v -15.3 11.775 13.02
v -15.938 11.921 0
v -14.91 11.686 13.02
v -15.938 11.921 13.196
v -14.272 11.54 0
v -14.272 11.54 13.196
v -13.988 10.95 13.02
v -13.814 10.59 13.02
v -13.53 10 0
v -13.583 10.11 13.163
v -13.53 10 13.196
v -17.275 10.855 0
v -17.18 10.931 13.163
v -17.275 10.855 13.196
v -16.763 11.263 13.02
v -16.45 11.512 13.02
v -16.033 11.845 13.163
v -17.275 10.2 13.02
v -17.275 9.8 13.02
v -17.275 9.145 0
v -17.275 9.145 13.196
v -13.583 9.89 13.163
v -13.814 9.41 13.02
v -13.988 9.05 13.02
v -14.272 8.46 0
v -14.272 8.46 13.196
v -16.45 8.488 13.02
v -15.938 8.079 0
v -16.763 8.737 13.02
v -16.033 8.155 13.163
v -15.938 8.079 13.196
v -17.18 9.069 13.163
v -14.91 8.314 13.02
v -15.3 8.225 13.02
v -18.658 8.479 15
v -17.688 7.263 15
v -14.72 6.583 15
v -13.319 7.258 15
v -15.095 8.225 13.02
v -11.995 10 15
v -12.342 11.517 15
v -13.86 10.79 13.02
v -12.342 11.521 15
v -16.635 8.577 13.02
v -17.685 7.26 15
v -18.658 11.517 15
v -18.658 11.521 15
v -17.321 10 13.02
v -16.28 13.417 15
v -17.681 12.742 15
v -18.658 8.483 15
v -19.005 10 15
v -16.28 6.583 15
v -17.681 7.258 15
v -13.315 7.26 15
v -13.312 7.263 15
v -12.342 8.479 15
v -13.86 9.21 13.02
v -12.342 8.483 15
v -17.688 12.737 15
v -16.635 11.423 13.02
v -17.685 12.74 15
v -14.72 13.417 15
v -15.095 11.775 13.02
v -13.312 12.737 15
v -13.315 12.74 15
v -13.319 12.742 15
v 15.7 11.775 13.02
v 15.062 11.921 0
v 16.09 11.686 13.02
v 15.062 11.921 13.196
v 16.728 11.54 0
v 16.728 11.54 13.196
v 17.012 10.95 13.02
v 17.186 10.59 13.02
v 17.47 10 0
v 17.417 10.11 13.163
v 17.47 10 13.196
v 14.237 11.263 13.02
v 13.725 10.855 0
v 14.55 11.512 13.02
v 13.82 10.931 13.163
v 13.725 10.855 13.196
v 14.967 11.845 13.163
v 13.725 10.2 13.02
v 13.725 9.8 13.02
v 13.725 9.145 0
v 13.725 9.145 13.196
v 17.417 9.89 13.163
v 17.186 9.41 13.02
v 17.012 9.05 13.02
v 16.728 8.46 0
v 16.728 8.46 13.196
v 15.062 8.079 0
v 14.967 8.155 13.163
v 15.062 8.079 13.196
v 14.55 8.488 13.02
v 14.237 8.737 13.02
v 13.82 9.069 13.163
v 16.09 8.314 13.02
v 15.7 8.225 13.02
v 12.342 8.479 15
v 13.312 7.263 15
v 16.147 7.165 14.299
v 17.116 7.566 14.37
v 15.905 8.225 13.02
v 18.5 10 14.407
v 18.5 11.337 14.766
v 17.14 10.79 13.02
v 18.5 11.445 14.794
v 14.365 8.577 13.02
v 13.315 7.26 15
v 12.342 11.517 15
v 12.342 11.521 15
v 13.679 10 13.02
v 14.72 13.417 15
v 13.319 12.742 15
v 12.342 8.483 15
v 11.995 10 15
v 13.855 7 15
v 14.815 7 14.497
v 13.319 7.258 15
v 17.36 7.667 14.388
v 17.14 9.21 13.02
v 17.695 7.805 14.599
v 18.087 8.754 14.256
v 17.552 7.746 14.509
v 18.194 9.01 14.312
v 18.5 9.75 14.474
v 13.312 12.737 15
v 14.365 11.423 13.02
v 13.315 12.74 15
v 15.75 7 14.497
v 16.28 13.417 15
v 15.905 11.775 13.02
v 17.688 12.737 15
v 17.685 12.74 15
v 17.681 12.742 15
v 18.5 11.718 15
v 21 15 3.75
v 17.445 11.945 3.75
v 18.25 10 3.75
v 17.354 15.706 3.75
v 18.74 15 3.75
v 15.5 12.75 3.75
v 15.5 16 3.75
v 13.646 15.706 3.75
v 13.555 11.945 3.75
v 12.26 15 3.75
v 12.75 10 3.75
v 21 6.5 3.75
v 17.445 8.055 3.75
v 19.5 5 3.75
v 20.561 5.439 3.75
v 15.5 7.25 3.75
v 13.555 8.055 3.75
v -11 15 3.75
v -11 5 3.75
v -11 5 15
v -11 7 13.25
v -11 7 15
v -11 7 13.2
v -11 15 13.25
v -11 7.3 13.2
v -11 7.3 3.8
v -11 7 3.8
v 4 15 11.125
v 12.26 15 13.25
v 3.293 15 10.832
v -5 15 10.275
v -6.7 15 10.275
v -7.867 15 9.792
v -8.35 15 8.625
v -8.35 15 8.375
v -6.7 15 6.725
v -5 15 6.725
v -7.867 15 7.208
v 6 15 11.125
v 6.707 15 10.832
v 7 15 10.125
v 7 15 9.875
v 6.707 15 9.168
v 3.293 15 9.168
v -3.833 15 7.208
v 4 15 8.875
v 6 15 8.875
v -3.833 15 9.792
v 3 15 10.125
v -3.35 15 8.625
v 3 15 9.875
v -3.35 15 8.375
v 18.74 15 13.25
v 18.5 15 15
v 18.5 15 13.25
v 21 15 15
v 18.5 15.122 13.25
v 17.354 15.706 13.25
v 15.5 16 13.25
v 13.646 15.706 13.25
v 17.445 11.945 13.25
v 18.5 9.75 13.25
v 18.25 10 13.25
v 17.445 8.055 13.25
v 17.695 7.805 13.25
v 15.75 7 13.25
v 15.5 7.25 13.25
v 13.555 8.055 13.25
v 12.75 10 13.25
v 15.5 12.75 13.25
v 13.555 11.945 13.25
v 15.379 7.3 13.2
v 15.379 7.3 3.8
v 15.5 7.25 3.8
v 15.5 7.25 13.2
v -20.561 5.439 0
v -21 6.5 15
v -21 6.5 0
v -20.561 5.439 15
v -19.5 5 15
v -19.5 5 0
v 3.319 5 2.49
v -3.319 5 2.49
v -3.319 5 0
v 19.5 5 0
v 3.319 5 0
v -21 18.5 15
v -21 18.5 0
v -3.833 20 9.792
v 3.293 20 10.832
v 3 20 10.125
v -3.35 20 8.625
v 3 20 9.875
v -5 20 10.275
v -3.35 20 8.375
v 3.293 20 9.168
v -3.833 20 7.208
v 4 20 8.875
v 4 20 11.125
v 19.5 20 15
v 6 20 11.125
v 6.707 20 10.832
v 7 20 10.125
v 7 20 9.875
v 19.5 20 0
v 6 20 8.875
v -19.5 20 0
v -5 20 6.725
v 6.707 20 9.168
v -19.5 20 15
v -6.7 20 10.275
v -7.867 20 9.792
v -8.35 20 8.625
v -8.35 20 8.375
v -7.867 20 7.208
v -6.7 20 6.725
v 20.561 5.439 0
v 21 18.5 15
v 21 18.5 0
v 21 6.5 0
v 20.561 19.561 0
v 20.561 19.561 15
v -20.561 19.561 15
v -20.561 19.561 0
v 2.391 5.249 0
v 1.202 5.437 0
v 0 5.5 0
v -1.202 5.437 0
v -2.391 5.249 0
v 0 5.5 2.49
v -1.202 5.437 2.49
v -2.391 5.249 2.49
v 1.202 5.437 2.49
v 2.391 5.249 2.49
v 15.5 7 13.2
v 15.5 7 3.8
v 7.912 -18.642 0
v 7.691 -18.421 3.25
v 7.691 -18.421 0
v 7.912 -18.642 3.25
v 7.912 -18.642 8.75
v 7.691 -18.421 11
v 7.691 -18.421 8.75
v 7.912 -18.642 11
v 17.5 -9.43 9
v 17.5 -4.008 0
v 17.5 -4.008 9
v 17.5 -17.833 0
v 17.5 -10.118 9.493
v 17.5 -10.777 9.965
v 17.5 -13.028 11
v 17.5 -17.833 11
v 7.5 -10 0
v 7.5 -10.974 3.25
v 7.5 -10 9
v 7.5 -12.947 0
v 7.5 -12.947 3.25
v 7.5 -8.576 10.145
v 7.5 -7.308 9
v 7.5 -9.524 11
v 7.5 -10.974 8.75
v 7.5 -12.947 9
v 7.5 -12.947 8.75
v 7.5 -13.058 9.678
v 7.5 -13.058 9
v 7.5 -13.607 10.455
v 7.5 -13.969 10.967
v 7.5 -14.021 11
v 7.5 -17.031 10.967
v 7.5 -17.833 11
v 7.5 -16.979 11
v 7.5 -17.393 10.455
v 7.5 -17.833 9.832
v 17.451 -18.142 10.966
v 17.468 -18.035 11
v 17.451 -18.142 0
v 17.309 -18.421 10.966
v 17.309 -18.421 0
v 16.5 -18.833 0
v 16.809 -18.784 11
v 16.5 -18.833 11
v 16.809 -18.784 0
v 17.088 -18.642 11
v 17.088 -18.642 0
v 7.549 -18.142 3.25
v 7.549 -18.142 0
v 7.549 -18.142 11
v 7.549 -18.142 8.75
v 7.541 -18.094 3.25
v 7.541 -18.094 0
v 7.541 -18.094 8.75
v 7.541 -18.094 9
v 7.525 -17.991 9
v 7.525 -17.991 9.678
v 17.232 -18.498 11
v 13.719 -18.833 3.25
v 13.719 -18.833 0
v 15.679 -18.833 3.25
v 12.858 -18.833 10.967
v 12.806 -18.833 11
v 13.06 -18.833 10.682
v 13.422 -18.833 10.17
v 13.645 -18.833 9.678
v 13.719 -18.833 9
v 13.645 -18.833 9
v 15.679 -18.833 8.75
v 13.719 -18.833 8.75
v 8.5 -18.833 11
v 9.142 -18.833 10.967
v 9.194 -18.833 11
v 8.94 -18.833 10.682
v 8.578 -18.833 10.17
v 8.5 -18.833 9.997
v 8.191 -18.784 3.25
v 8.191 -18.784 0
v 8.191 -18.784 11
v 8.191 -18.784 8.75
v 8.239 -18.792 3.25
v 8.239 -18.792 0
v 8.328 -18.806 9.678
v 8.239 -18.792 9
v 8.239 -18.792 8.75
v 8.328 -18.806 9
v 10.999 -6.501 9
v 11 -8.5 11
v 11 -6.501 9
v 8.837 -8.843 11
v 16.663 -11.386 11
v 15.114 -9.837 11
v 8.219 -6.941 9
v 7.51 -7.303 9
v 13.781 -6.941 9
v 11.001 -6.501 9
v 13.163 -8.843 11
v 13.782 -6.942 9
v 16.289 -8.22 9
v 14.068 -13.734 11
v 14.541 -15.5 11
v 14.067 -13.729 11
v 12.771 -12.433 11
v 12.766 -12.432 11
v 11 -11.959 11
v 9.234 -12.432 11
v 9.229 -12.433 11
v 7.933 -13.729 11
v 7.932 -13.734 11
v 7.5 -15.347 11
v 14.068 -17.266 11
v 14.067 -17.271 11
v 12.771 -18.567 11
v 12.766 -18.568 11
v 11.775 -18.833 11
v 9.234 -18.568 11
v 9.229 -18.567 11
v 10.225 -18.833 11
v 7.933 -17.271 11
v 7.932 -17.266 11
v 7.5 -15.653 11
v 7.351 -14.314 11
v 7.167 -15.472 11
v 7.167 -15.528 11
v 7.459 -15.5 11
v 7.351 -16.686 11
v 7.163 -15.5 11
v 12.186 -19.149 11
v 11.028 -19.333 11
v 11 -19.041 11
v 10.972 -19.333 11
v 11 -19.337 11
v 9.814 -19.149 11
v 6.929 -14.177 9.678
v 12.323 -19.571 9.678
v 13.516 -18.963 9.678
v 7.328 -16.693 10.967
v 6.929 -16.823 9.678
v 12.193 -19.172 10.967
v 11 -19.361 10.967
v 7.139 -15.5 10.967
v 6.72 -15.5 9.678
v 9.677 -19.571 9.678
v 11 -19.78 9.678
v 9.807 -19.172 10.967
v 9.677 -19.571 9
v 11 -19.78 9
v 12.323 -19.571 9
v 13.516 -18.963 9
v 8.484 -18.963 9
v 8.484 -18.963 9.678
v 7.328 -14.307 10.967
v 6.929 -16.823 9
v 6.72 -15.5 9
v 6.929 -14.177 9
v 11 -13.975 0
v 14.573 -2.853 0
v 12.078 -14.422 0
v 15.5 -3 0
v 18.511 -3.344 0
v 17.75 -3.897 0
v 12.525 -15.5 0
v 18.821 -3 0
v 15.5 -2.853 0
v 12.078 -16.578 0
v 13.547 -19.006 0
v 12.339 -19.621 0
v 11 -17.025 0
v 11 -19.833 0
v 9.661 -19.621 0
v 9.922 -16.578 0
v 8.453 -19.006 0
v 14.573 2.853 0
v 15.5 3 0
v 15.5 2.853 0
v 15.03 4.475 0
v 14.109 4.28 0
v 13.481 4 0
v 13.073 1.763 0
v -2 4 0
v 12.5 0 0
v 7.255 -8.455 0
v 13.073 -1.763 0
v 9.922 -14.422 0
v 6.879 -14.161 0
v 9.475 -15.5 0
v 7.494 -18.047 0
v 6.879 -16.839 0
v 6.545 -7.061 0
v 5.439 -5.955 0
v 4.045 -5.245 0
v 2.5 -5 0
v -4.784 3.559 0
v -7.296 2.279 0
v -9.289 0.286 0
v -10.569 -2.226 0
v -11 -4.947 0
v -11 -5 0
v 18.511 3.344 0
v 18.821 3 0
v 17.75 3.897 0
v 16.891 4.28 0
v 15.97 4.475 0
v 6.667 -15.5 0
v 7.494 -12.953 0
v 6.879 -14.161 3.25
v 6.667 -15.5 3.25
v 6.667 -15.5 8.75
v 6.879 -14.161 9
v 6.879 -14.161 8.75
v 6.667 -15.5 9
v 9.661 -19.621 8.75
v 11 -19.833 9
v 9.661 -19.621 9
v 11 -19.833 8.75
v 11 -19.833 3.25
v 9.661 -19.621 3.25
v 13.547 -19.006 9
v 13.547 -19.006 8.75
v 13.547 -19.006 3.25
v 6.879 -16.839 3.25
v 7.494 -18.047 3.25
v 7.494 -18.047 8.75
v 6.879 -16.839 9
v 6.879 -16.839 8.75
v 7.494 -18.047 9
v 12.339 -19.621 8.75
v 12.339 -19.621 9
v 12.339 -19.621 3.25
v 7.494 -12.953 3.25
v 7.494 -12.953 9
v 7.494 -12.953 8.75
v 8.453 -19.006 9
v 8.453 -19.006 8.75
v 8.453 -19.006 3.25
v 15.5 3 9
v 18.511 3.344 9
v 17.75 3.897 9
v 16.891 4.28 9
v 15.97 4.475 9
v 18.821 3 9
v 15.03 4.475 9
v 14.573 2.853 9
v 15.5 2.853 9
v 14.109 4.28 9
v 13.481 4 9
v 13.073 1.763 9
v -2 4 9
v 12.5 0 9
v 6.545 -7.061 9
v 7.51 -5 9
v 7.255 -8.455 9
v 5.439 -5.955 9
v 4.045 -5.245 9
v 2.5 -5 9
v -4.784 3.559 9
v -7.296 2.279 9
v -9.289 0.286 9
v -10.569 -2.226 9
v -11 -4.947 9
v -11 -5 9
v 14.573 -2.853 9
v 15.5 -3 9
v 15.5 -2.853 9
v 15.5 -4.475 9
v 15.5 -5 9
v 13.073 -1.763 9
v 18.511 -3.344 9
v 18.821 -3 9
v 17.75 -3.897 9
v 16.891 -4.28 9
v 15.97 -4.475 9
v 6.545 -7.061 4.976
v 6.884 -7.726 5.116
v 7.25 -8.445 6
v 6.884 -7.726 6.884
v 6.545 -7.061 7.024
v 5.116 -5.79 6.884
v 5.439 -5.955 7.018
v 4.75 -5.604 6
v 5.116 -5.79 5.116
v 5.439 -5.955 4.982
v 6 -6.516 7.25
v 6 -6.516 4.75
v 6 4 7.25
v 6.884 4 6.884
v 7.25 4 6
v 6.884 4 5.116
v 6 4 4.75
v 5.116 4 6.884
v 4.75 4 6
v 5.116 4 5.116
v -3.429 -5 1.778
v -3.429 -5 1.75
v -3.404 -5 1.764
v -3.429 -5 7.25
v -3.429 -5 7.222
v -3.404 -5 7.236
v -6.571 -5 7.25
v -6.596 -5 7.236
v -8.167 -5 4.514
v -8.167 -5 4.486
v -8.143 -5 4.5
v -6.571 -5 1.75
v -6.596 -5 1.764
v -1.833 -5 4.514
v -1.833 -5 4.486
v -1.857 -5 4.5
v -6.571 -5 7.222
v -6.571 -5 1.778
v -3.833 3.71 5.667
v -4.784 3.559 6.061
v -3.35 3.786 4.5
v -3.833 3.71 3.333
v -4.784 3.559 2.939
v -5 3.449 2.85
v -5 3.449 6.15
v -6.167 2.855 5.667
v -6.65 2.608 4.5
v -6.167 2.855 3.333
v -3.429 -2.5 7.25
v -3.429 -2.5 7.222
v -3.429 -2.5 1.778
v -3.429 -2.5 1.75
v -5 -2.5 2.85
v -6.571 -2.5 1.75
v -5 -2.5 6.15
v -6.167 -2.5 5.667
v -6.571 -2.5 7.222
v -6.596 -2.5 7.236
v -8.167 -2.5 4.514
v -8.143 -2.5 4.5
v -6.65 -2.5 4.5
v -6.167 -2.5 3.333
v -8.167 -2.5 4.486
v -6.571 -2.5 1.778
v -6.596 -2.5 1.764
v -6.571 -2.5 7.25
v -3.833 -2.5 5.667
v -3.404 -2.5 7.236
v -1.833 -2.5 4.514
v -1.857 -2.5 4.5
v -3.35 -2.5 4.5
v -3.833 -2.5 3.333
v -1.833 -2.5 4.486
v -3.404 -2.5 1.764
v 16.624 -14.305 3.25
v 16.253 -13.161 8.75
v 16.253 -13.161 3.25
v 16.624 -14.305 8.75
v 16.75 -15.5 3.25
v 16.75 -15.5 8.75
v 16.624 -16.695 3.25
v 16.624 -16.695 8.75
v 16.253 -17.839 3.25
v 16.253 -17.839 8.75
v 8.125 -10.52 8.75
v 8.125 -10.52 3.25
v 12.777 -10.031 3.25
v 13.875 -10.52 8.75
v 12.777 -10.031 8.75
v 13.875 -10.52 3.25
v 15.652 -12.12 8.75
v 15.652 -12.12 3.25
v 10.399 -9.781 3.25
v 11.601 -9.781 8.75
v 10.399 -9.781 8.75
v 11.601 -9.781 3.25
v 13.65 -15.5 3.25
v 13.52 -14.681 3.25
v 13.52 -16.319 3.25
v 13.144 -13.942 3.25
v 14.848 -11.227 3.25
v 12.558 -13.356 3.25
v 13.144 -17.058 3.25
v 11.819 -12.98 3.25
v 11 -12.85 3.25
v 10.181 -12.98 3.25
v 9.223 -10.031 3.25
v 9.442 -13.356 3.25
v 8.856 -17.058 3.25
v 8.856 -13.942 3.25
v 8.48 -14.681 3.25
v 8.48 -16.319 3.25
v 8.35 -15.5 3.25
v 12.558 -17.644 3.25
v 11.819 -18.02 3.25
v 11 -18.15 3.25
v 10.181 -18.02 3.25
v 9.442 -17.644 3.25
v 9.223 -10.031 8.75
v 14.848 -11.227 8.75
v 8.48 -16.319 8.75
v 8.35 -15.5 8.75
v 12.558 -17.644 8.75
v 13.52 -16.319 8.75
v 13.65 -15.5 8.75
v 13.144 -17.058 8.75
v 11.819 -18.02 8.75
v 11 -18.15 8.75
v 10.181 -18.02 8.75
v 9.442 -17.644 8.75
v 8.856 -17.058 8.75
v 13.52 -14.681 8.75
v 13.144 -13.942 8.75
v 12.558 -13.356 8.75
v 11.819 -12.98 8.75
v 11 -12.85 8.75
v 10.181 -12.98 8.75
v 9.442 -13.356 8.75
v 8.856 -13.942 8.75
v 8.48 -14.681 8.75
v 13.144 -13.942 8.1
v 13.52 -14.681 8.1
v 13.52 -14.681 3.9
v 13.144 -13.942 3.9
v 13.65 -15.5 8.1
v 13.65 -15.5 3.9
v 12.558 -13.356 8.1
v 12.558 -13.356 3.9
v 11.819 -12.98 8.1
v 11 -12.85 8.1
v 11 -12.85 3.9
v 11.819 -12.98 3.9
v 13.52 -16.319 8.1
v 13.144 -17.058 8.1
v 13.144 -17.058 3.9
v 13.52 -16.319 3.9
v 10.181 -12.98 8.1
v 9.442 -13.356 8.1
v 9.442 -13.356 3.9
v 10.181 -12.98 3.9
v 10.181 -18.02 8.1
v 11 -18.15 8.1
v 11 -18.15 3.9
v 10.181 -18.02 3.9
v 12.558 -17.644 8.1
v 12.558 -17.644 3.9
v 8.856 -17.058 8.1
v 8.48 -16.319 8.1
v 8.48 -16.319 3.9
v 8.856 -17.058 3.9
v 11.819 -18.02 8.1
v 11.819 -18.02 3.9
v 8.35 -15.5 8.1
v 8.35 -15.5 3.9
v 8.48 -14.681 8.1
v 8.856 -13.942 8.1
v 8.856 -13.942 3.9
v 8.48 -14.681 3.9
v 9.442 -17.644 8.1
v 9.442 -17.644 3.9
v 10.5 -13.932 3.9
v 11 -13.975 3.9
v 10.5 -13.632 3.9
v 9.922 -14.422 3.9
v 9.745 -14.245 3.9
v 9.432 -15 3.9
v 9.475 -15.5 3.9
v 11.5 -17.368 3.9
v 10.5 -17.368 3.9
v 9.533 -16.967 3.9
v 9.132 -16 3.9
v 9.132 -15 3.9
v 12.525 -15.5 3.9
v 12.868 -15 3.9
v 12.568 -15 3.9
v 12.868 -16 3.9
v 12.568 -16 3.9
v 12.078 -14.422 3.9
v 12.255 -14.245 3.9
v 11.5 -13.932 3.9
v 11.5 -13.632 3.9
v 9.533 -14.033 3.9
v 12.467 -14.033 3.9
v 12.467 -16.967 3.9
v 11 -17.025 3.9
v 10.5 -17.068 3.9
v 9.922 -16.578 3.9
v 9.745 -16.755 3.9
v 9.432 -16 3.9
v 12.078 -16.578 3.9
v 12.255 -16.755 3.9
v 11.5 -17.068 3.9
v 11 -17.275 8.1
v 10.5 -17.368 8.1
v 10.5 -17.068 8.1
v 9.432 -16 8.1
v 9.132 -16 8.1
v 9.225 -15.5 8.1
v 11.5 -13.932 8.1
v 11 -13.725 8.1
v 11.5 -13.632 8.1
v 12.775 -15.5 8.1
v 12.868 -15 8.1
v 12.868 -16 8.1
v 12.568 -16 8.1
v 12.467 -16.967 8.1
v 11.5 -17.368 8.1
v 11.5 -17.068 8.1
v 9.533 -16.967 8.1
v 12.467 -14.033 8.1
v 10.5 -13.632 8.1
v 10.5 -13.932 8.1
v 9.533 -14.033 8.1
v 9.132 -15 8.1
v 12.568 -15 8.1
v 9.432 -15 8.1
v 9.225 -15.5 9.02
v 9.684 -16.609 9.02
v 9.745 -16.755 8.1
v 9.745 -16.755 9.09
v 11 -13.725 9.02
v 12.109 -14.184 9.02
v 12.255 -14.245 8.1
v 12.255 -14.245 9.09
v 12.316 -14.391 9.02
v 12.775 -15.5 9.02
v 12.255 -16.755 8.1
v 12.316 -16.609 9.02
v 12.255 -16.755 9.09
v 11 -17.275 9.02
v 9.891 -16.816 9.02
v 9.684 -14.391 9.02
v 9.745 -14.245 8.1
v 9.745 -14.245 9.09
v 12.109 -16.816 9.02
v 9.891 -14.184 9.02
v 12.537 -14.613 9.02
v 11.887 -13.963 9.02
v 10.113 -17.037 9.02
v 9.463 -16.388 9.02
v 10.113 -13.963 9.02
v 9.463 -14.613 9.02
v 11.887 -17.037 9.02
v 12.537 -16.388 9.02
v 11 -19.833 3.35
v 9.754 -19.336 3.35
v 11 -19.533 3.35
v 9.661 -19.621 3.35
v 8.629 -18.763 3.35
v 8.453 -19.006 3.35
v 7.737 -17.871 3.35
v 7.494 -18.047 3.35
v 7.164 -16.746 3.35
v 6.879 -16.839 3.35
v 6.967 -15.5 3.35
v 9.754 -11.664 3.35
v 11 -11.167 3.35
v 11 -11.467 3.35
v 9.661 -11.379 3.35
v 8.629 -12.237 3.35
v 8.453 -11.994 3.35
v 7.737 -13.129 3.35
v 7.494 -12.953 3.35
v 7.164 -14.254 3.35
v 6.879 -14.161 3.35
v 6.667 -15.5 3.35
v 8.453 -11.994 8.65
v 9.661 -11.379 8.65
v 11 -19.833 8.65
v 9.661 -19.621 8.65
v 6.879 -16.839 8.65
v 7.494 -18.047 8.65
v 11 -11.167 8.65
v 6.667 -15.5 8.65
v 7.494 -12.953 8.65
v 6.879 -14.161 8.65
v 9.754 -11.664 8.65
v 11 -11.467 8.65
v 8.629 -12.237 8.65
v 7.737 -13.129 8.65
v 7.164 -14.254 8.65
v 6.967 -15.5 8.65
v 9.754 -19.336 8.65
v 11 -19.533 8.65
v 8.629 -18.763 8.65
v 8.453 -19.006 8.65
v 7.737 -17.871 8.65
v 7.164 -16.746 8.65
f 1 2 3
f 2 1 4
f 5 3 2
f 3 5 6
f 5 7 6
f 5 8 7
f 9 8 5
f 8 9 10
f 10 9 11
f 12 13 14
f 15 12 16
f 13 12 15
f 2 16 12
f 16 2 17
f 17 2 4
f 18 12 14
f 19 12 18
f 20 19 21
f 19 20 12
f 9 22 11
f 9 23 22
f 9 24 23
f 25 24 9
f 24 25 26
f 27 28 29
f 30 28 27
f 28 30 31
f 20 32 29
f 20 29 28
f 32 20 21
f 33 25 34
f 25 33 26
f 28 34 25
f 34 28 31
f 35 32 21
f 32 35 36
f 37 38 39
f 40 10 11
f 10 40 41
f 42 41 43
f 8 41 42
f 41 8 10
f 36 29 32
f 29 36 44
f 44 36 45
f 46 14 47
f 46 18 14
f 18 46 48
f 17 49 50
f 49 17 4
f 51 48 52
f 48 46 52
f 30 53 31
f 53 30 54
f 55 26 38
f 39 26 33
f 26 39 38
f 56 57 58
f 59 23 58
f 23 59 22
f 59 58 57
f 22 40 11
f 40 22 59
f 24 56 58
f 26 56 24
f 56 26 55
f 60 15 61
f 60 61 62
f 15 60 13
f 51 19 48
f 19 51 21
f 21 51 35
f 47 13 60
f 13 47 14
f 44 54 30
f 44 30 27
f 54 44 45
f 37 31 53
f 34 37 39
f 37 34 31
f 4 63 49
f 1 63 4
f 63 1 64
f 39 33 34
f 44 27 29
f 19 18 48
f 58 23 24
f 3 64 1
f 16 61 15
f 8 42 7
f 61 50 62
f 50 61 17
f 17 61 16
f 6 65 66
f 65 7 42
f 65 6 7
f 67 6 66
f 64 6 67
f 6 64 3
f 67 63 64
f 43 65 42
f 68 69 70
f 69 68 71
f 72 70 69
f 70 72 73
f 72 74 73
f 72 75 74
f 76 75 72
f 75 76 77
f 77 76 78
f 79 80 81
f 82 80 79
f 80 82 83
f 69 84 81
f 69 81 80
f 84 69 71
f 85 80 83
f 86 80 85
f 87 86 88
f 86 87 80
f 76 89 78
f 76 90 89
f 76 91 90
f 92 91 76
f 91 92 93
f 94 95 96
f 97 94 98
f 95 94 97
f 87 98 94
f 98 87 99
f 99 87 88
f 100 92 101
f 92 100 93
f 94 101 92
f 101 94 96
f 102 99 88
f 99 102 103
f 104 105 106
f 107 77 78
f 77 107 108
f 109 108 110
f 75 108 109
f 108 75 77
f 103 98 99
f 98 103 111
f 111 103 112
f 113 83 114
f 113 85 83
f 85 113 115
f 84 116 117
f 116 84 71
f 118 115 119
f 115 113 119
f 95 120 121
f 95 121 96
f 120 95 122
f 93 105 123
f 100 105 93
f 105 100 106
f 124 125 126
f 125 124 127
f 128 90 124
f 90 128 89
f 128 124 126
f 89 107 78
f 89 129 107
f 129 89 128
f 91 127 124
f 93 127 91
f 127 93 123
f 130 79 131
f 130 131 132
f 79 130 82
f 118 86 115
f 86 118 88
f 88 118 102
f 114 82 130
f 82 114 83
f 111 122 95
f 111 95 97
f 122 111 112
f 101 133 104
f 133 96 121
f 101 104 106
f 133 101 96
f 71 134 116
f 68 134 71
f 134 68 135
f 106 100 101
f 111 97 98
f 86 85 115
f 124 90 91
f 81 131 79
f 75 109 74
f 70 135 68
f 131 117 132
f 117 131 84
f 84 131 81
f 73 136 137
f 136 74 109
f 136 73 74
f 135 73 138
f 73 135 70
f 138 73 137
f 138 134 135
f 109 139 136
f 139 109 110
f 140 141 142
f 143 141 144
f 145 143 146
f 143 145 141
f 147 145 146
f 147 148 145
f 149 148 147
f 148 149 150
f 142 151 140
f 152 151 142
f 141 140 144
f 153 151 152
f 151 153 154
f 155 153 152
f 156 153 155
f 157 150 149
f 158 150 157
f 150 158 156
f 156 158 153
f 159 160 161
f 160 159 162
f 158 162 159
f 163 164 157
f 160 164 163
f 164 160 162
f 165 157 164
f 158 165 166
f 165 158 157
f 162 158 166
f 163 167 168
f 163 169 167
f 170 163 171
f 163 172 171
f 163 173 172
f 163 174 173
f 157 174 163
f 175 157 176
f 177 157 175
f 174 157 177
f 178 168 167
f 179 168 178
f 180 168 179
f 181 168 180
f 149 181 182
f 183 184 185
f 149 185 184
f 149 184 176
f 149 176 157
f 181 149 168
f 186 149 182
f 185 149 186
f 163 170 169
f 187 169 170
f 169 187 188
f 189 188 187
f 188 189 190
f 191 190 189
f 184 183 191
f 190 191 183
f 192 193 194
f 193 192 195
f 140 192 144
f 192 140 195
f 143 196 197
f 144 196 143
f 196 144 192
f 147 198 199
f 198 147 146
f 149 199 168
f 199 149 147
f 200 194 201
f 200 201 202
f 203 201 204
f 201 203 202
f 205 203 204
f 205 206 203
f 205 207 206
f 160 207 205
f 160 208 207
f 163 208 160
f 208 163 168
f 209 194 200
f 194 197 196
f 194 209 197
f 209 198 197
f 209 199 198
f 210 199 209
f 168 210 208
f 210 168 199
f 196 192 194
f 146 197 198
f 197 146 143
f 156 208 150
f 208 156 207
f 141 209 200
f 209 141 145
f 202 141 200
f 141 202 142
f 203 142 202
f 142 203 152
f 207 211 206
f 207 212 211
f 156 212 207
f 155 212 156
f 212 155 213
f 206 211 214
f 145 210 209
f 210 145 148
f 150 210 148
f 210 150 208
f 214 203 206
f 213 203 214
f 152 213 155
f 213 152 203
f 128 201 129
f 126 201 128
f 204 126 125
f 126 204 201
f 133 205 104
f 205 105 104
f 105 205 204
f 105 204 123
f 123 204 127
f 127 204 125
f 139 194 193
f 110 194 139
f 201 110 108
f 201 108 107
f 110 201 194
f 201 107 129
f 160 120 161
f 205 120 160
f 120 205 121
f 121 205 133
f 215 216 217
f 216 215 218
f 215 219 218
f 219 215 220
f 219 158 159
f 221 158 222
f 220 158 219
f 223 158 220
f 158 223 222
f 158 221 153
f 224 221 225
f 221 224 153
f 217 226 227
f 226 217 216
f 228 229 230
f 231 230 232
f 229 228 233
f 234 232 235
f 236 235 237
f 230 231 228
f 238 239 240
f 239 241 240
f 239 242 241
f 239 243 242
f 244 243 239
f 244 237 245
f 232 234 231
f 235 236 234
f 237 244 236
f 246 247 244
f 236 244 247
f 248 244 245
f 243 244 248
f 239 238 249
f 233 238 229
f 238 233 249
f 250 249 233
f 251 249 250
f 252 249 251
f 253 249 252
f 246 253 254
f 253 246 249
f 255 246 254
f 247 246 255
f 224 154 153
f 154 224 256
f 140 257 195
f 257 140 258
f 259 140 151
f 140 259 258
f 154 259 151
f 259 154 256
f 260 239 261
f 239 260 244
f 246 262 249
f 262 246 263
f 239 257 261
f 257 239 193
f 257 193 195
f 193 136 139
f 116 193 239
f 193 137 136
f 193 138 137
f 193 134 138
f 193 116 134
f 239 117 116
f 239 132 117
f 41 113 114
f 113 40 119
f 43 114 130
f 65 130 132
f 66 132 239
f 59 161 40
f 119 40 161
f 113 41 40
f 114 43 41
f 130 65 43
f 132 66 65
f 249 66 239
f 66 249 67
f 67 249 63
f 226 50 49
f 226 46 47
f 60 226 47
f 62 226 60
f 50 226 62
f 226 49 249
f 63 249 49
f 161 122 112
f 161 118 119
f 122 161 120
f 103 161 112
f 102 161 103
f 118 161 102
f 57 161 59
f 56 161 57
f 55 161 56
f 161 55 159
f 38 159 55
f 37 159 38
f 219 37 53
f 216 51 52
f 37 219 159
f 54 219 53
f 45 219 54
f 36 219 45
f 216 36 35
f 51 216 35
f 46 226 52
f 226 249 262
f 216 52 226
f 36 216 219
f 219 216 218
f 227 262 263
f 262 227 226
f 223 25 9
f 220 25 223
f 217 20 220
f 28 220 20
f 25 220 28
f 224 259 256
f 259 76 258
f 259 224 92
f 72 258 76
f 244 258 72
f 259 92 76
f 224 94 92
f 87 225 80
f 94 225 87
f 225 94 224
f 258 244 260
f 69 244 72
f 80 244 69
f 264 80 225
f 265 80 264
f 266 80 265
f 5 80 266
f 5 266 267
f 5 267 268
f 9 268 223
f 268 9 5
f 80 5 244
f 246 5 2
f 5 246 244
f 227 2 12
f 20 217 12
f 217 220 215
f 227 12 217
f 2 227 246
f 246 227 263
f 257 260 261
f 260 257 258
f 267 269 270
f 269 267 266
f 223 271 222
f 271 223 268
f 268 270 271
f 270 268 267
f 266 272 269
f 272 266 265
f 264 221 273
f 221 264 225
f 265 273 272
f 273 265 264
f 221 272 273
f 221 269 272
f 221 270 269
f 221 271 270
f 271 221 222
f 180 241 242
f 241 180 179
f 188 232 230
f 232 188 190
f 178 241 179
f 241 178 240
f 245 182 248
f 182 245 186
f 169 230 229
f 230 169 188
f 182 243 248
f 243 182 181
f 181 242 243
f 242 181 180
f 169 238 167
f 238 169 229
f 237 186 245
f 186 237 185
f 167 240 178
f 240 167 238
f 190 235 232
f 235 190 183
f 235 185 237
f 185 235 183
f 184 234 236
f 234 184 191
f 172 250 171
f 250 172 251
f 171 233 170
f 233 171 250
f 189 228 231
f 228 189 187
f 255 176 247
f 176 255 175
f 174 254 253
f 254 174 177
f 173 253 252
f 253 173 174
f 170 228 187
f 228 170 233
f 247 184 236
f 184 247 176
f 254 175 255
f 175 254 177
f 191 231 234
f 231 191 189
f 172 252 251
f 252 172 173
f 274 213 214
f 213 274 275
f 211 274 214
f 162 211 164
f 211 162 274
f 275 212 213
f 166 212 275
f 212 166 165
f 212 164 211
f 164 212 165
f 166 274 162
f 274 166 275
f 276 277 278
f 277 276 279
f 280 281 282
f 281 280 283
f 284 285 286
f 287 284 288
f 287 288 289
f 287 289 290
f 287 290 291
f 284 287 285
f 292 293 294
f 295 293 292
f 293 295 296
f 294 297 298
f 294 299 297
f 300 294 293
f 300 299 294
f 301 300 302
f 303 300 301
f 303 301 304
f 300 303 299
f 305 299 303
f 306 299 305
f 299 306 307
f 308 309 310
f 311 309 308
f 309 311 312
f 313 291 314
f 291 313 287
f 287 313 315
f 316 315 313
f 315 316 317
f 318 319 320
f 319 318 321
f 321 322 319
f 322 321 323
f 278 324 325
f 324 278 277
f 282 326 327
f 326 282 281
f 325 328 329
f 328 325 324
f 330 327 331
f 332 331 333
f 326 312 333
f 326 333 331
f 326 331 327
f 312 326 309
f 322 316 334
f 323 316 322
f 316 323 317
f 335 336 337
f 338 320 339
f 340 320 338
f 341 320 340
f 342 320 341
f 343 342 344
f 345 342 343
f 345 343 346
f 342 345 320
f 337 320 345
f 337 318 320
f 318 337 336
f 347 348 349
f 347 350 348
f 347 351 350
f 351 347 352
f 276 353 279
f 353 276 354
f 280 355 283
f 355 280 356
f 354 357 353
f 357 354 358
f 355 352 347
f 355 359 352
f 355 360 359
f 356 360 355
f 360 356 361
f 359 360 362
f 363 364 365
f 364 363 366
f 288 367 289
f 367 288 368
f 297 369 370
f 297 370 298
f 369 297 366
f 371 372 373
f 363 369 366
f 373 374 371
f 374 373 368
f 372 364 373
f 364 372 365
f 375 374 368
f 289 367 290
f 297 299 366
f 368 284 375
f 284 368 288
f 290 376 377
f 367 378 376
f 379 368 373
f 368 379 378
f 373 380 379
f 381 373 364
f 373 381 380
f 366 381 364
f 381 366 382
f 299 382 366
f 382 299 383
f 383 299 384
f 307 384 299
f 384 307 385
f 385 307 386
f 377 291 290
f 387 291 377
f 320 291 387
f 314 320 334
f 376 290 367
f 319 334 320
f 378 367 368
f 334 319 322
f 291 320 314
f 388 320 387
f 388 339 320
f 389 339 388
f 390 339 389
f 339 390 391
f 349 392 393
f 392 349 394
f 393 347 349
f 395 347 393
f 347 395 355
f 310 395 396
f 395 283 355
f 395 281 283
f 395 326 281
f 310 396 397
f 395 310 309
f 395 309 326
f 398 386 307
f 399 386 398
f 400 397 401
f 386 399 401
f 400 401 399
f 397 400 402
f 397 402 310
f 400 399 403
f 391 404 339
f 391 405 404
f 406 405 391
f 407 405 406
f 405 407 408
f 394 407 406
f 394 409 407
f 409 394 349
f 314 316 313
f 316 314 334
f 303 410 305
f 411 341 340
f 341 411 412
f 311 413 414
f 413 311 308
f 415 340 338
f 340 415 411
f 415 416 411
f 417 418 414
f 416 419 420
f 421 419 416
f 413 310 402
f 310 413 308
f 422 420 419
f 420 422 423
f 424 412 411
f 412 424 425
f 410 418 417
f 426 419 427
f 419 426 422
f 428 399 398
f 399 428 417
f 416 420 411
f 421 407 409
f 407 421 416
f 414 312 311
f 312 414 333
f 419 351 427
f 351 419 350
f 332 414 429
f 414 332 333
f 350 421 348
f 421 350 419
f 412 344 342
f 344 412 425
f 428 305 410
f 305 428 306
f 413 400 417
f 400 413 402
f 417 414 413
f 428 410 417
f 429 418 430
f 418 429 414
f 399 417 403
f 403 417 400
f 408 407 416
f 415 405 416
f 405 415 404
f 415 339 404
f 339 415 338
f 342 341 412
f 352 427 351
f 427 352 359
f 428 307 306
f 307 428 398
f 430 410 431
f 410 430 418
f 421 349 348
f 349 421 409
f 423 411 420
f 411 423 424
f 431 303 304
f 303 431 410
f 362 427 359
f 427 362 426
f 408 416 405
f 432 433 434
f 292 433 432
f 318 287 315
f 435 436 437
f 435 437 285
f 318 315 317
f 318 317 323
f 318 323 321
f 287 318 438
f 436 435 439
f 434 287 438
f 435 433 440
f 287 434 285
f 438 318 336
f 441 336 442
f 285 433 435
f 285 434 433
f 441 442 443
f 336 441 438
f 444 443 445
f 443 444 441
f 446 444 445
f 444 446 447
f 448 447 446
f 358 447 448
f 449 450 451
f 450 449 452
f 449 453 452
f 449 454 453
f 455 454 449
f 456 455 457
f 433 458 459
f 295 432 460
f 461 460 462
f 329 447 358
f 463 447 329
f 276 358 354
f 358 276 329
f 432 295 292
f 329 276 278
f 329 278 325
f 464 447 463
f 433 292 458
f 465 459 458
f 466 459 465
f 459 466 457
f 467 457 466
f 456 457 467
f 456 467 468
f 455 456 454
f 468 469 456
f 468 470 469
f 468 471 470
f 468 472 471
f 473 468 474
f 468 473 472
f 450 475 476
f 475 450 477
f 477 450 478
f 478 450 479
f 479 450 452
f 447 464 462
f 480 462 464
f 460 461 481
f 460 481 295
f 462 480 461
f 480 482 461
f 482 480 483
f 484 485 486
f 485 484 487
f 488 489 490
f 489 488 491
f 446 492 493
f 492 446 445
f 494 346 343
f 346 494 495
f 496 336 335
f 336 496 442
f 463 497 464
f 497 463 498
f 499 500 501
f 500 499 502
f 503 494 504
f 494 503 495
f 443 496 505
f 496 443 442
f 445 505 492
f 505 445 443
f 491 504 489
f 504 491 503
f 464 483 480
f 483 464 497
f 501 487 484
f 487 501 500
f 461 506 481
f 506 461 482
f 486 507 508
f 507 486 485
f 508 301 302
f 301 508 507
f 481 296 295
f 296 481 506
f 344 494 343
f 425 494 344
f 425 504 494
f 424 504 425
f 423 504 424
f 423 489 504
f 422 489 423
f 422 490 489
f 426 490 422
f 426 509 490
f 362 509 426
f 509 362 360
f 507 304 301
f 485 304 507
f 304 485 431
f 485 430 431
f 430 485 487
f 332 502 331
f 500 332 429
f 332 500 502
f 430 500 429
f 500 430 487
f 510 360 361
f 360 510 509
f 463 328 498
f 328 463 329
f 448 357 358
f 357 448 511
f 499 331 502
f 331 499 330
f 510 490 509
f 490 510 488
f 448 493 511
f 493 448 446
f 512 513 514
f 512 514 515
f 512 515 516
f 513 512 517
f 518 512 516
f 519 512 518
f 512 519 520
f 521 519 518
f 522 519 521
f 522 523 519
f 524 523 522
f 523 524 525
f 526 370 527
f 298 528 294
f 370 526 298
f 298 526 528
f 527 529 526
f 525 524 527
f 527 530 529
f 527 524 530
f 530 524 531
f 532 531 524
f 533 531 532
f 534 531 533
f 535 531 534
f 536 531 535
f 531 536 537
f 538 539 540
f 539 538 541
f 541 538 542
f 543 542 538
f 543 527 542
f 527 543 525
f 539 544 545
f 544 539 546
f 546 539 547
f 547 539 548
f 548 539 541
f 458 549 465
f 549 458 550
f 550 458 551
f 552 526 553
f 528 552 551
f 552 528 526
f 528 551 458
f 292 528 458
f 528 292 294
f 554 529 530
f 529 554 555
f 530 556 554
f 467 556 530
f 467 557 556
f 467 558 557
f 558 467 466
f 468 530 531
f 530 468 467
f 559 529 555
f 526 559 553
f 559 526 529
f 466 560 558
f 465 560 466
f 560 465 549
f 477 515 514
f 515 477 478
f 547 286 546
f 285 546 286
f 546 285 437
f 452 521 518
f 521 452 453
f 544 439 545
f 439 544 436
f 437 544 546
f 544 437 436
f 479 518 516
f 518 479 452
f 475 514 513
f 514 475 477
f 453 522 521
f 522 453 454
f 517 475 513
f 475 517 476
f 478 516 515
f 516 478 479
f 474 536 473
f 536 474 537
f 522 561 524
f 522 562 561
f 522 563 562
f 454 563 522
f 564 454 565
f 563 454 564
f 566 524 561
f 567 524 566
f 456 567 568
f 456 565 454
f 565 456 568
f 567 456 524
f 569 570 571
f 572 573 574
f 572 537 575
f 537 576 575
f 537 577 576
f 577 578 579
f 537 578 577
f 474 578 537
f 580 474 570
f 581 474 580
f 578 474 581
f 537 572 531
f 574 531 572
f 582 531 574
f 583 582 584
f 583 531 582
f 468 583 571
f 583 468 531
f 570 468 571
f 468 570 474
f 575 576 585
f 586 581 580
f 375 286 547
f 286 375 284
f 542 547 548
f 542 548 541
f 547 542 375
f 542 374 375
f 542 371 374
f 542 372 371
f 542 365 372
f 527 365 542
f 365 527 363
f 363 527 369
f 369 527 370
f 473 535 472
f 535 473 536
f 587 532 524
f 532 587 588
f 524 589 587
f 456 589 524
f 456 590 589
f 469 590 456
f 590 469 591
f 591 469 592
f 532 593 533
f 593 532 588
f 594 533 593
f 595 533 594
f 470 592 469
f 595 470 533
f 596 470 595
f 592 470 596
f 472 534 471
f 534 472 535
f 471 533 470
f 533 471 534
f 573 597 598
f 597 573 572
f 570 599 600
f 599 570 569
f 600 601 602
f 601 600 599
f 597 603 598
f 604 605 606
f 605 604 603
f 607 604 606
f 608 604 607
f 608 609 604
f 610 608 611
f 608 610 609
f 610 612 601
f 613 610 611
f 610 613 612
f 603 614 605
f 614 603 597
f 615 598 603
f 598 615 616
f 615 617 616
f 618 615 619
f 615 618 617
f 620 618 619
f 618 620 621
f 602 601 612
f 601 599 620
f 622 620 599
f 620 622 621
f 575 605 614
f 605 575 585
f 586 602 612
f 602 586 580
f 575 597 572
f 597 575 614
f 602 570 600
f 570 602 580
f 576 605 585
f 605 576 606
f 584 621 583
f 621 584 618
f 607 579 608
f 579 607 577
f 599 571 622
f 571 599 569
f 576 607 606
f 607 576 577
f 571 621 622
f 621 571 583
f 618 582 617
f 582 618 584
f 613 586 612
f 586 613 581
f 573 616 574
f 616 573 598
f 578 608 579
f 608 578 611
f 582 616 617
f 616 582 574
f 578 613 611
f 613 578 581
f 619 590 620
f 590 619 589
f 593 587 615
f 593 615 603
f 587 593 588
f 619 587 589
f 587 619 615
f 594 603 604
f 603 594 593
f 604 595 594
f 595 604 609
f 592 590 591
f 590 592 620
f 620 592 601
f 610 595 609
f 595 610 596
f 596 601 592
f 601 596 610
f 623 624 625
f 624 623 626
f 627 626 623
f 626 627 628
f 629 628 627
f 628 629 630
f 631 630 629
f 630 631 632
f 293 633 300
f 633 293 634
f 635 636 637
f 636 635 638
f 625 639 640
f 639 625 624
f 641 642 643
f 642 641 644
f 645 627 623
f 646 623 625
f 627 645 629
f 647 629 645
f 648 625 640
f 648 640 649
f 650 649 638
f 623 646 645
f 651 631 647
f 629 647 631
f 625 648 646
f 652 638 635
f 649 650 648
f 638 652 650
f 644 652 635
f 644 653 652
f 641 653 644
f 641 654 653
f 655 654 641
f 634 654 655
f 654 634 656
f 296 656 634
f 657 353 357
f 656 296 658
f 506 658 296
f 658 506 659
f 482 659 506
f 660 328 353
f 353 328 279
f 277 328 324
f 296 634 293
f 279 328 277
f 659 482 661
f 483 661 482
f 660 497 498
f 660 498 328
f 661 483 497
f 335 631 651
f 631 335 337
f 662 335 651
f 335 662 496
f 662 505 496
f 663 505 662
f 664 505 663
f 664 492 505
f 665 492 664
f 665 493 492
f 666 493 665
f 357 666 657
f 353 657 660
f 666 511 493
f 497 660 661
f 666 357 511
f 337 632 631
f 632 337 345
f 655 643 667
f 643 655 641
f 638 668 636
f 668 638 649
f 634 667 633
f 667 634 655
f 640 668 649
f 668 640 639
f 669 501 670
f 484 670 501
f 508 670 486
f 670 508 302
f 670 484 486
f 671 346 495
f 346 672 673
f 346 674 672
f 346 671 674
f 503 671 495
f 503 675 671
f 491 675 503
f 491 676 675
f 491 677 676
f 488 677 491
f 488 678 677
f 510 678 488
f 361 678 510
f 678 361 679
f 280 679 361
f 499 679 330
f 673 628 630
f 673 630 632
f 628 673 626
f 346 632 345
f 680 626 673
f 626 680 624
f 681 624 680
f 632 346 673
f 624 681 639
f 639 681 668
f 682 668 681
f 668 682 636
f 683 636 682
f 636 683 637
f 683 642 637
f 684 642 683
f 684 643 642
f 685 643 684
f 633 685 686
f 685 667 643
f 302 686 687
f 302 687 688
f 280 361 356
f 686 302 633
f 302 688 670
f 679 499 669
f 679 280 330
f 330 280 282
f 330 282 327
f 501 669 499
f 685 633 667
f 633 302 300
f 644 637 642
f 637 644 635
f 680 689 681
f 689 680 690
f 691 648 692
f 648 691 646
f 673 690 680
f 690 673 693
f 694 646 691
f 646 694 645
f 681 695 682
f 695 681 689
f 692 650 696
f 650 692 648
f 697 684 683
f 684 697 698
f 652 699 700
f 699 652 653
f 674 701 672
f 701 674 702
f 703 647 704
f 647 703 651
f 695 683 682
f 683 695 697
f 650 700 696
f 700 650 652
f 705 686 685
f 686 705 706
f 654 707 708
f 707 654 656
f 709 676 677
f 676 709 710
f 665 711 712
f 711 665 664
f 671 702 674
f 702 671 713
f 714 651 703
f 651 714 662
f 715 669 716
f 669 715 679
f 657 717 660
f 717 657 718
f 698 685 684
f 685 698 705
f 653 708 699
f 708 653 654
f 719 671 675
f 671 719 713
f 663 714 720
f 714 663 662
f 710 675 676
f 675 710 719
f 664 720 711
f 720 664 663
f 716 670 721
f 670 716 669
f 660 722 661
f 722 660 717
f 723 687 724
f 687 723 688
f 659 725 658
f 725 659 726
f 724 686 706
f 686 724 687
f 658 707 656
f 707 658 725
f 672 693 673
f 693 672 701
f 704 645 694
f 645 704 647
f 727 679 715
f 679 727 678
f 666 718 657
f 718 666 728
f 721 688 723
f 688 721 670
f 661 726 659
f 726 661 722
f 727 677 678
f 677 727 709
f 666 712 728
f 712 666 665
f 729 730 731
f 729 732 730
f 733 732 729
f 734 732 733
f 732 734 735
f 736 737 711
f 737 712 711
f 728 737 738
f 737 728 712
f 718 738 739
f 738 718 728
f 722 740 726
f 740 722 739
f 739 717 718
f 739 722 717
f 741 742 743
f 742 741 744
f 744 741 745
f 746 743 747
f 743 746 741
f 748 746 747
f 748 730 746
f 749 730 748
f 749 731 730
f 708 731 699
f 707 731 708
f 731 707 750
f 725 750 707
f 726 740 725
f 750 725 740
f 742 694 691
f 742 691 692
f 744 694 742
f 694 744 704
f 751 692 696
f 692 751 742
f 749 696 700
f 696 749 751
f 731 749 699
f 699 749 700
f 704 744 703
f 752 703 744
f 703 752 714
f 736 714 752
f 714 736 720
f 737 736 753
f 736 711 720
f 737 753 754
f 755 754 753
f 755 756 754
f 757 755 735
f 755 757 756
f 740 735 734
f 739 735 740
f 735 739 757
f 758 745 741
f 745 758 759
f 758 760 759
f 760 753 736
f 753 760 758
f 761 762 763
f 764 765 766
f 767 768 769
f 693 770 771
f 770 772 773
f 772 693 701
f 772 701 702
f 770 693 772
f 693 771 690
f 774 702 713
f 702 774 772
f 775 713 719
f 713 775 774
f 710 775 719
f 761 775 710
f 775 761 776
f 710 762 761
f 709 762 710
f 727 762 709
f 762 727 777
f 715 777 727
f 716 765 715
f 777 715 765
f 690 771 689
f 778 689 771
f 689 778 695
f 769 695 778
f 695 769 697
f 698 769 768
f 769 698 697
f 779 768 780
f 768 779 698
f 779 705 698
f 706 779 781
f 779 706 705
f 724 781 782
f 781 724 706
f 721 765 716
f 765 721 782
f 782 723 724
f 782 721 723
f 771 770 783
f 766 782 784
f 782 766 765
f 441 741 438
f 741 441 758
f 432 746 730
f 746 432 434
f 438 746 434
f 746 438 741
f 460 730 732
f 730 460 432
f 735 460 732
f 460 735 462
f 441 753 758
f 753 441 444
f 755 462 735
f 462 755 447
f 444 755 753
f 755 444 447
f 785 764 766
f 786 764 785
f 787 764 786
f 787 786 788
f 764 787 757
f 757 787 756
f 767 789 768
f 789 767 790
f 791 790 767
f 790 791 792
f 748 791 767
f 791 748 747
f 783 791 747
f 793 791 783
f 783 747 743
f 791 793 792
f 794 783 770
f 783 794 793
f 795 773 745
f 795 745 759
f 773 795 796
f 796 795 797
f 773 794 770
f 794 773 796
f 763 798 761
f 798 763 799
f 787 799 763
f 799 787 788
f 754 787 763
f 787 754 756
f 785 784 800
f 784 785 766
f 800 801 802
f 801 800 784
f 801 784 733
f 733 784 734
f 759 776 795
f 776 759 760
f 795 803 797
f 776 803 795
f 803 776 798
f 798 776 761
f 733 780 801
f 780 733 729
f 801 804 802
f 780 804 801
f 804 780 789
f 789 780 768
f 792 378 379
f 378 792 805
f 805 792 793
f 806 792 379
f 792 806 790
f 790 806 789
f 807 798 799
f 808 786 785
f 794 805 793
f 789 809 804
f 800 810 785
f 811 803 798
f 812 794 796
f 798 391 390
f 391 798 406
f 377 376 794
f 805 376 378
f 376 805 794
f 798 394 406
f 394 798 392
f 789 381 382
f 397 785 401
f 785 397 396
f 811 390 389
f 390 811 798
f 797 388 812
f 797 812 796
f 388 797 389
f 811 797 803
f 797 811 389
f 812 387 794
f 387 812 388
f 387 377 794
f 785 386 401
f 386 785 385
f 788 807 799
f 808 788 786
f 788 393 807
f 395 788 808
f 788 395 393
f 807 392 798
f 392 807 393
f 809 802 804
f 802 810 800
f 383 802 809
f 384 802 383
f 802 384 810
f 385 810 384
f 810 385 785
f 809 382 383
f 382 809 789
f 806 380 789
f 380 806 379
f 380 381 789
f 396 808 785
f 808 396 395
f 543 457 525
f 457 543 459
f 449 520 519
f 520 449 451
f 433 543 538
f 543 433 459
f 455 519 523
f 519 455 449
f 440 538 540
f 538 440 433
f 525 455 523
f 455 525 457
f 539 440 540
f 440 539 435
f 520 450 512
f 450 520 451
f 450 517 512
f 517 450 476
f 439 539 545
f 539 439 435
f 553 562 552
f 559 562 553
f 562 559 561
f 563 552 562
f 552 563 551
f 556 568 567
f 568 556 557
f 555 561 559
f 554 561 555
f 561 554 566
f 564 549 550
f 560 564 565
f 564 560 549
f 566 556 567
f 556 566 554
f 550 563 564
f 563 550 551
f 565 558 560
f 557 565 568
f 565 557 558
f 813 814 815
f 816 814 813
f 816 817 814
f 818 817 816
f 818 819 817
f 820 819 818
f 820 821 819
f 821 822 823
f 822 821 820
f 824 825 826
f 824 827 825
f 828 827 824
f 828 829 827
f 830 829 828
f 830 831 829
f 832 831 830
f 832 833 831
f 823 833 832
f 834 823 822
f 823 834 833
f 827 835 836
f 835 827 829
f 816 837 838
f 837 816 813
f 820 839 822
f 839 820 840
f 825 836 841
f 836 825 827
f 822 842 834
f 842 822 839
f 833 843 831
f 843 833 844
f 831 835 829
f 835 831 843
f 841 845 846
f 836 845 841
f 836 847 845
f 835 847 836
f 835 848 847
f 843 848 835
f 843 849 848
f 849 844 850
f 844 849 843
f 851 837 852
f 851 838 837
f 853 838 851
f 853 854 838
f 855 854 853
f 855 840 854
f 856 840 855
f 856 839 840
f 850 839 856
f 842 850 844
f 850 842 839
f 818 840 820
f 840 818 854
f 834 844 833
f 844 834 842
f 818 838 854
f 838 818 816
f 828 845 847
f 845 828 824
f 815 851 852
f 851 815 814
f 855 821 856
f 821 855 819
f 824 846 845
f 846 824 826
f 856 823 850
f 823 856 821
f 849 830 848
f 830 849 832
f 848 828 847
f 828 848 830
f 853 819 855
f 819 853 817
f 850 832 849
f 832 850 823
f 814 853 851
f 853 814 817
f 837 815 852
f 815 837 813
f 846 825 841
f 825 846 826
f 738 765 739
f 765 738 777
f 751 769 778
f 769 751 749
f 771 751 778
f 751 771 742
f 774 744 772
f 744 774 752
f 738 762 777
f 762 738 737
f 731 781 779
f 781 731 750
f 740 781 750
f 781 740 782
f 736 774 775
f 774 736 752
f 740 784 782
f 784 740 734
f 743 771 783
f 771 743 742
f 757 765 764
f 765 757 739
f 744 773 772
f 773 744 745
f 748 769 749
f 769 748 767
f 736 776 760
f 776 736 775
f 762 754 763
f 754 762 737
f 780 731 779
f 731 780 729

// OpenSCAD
nema17_side = 42;
nema17_bolt_distance = 31;
m3_hole = 3.3;
m3_nut_hole = 5.5;
block_beam_height = 5;
block_anchor_height = 10;
block_height = block_beam_height+block_anchor_height;
block_thickness = 15;
block_roundness = 1.5;
block_base_thickness = 4;
filament_x_offset = 6;
filament_z_offset = 10;
filament_guide_length = 4;
filament_hole = 2;
hinge_inner_diameter = 6;
hinge_outer_diameter = 9;
lever_thickness = 9;
lever_trench_start = 10;
tension_bolt_x_offset = 10;
tension_bolt_z_offset = block_base_thickness+lever_thickness/2;
tension_bolt_diameter = m3_hole;
tension_bolt_guide_length = 5;
plunger_bearing_size = 10; // 623 bearing: 10
plunger_bearing_height = 4; // 623 bearing: 4

module rprism(size=[10,10,10], r=1, center=false) {
    t = center ? [0, 0, 0] : [r, r, 0];
    minkowski() {
        translate(t) cube([size[0]-2*r, size[1]-2*r, size[2]-0.001] , center=center);
        cylinder(r=r, h=0.001);
    }
}

module hexagon(size, h, center=false) {
    boxWidth=size/1.75;
    translate ([0, 0, center ? 0 : h/2]) {
        union(){
            cube([boxWidth, size, h], center=true);
            rotate([0,0,60]) cube([boxWidth, size, h], center=true);
            rotate([0,0,-60]) cube([boxWidth, size, h], center=true);
        }
    }
}

module polyhole(d, h, center=false, d1=-1, d2=-1) {
    n = max(round(2 * ((d1<0 || d2<0) ? d : max(d1, d2))),3);
    if (d1<0 || d2<0) {
        echo("one:", d);
        cylinder(h = h, r = (d / 2) / cos (180 / n), center=center, $fn = n);
    } else {
        echo("two:", d1, d2);
        cylinder(h = h, r1 = (d1 / 2) / cos (180 / n), r2 = (d2 / 2) / cos (180 / n), center=center, $fn = n);
    }
}


module block() {
    $fn=8;
    union () {
        difference () {
            translate([-nema17_side/2, -block_anchor_height, 0]) rprism([nema17_side, block_height, block_thickness], r=block_roundness, center=false);
            // Motor shaft bevel
            #translate([0, -nema17_side/2, -0.01]) cylinder(r=11.5, h=2.5, $fn=60);
            // filament guide
            #translate([filament_x_offset+filament_hole/2-filament_guide_length/2, (block_anchor_height-block_height)/2, filament_z_offset]) rotate([90, 0, 0]) rprism([filament_guide_length, filament_hole+0.25, block_height+0.02], r=filament_hole/2, center=true);
            // tension bolt guide
            #translate([(tension_bolt_guide_length+tension_bolt_diameter)/2-(tension_bolt_x_offset), (block_anchor_height-block_height)/2, tension_bolt_z_offset]) rotate([90, 0, 0]) rprism([tension_bolt_guide_length, tension_bolt_diameter+0.25, block_height+0.02], r=tension_bolt_diameter/2, center=true);
            // mounting bolt holes
            for (i = [-1, 1]) {
                translate([i*nema17_bolt_distance/2, -block_anchor_height/2, 0]) {
                    // translate([0, 0, block_thickness/2]) cylinder(r=(m3_hole+0.25)/2, h=block_thickness+0.02, center=true);
                    // translate([0, 0, block_thickness-0.6*m3_hole]) cylinder(r1=(m3_hole+0.25)/2, r2=m3_hole+0.25, h=0.6*m3_hole+0.01);
                    translate([0, 0, block_thickness/2]) polyhole(d=m3_hole+0.25, h=block_thickness+0.02, center=true);
                    translate([0, 0, block_thickness-0.6*m3_hole]) polyhole(d1=m3_hole+0.25, d2=2*m3_hole+0.25, h=0.6*m3_hole+0.01);
                }
            }
            // lever
            difference() {
                union() {
                    translate([lever_trench_start-nema17_side/2, -(block_anchor_height+0.01), block_base_thickness-0.25]) {
                        cube([nema17_side, block_anchor_height+0.01, block_thickness]);
                    }
                    translate([nema17_bolt_distance/2, -block_anchor_height/2, block_base_thickness-0.25]) {
                        cylinder(r=hinge_outer_diameter/2+1.5, h=lever_thickness+0.5, $fn=20);
                    }
                }
                translate([nema17_bolt_distance/2, -block_anchor_height/2, block_base_thickness-0.25]) {
                    translate([0, 0, lever_thickness/2]) cylinder(r=(hinge_inner_diameter-0.50)/2, h=block_thickness, center=true);
                    translate([hinge_inner_diameter/2, -hinge_inner_diameter/2, lever_thickness+0.5]) {
                        rotate([0, 0, 90]) {
                            rprism([block_height, nema17_side, block_thickness], r=(hinge_inner_diameter-0.5)/2);
                        }
                    }
                }
            }
        }
        // support
        translate([lever_trench_start-nema17_side/2, -(block_anchor_height+hinge_inner_diameter)/2, block_base_thickness-0.2]) {
            cube([nema17_side/2+nema17_bolt_distance/2-lever_trench_start, 0.3, lever_thickness+0.4]);
        }
    }
}

module plunger() {
    lever_length=nema17_side-(lever_trench_start+(nema17_side-nema17_bolt_distance)/2);
    lever_height=block_anchor_height-1;
    bearing_lever_width=hinge_outer_diameter+1;
    bearing_lever_length=(nema17_bolt_distance+2*plunger_bearing_size/3)/2;
    bearing_lever_offset=-3;
    bearing_lever_thickness=11;
    bearing_axis_x_offset=filament_x_offset+plunger_bearing_size/2-nema17_bolt_distance/2;
    bearing_z_offset=filament_z_offset-block_base_thickness;
    joint_radius=5;
    union() {
        difference() {
            union() {
                cylinder(r=hinge_outer_diameter/2, h=lever_thickness, $fn=30);
                translate([-lever_length, -block_anchor_height/2, 0]) cube([lever_length, lever_height, lever_thickness]);
                translate([-bearing_lever_width/2+bearing_lever_offset, -bearing_lever_length, 0]) rprism([bearing_lever_width, bearing_lever_length-hinge_inner_diameter/2, lever_thickness], $fn=20);
                intersection() {
                    translate([-bearing_lever_width/2+bearing_lever_offset, -bearing_lever_length, lever_thickness-0.002]) rprism([bearing_lever_width, plunger_bearing_size*1.3, bearing_lever_thickness+0.003-lever_thickness], $fn=20);
                    translate([bearing_axis_x_offset, -nema17_bolt_distance/2, lever_thickness-0.001])
                        cylinder(r1=plunger_bearing_size*0.9, r2=plunger_bearing_size*0.9-2, h=bearing_lever_thickness+0.001-lever_thickness, $fn=20); 
                }
                translate([bearing_axis_x_offset, -nema17_bolt_distance/2, 0]) {
                    cylinder(r=plunger_bearing_size/3+1, lever_thickness, $fn=20); 
                    translate([0, 0, lever_thickness]) {
                        difference() {
                            sphere(r=plunger_bearing_size/3+1,$fn=20);
                            translate([0, 0, bearing_lever_thickness-lever_thickness+plunger_bearing_size/2]) cube(plunger_bearing_size, center=true);
                        }
                    } 
                }
                // joint bezel
                translate([-bearing_lever_width/2+bearing_lever_offset, -block_anchor_height/2, 0]) {
                    difference() {
                        translate ([-joint_radius, -joint_radius, 0]) cube([joint_radius+0.01, joint_radius+0.01, lever_thickness]);
                        translate([-joint_radius, -joint_radius, -0.01]) cylinder(r=joint_radius, h=lever_thickness+0.02, $fn=20);
                    }
                }
            }
            // hinge cutout
            translate([0, 0, -0.01]) cylinder(r=hinge_inner_diameter/2, h=lever_thickness+0.02);
            translate([0, -hinge_inner_diameter/2, -0.01]) cube([hinge_outer_diameter/2+1, hinge_inner_diameter, lever_thickness+0.02]);
            // lever bezel
            translate([-lever_length-0.01, -block_anchor_height/2, -0.01]) {
                difference() {
                    cube([lever_height+0.01, lever_height+0.01, lever_thickness+0.02]);
                    translate([lever_height+0.01, -0.01, -0.01]) cylinder(r=lever_height+0.01, h=lever_thickness+0.04, $fn=20);
                }
            }
            // filament guide
            #translate([filament_x_offset-nema17_bolt_distance/2, 0, filament_z_offset-block_base_thickness]) rotate([90, 0, 0]) cylinder(r=(filament_hole+0.5)/2, h=4*lever_height, $fn=8, center=true);
            // tension bolt hole
            #translate([-(nema17_bolt_distance/2+tension_bolt_x_offset-tension_bolt_guide_length), 0, tension_bolt_z_offset-block_base_thickness]) rotate([90, 0, 0]) {
                cylinder(r=tension_bolt_diameter/2, h=2*lever_thickness, $fn=8, center=true);
                translate([0, 0, lever_height/2-2]) hexagon(size=m3_nut_hole, h=3);
            }
            // bearing cradle
            translate([bearing_axis_x_offset, -nema17_bolt_distance/2, bearing_z_offset]) {
                cylinder(r=(plunger_bearing_size)/2, h=plunger_bearing_height+0.2, center=true); 
                difference() {
                    cylinder(r=(plunger_bearing_size+1.5)/2, h=plunger_bearing_height+1.5, center=true, $fn=30); 
                    cylinder(r=m3_hole/2+1, h=plunger_bearing_height+1.52, center=true, $fn=20); 
                }
                %cylinder(r=plunger_bearing_size/2, h=plunger_bearing_height, center=true, $fn=30);
            }
            // bearing axis hole
            translate([bearing_axis_x_offset, -nema17_bolt_distance/2, 0]) {
                translate([0, 0, -0.01]) cylinder(r=(m3_hole-0.25)/2, h=bearing_z_offset,$fn=8);
                translate([0, 0, bearing_z_offset]) cylinder(r=(m3_hole+0.25)/2, h=bearing_z_offset,$fn=8);
                translate([0, 0, bearing_lever_thickness-0.6*m3_hole]) cylinder(r1=(m3_hole+0.25)/2, r2=m3_hole+0.25, h=0.6*m3_hole+0.01);
            }
        }
        // support
        translate([bearing_axis_x_offset, -nema17_bolt_distance/2, bearing_z_offset]) {
            difference() {
                cylinder(r=plunger_bearing_size/3+1, h=plunger_bearing_height+1.3, $fn=20, center=true); 
                cylinder(r=plunger_bearing_size/3+0.7, h=plunger_bearing_height+1.5, $fn=20, center=true); 
                translate([plunger_bearing_size*0.55, 0, 0]) cube([plunger_bearing_size*1.1, plunger_bearing_size*1.1, plunger_bearing_size+1.5], center=true);
            }
        }
        translate([bearing_axis_x_offset, -nema17_bolt_distance/2, bearing_z_offset]) {
            difference() {
                cylinder(r=(m3_hole+0.25)/2+0.3, h=plunger_bearing_height+0.3, $fn=8, center=true); 
                cylinder(r=(m3_hole+0.25)/2, h=plunger_bearing_height+0.5, $fn=8, center=true); 
                cube([2*m3_hole, 1, plunger_bearing_height+0.5], center=true);
                cube([1, 2*m3_hole, plunger_bearing_height+0.5], center=true);

            }
        }
    }
}

module logo() {
    translate([-7, -4, 0]) linear_extrude(height=1.2, center=true) scale(0.4) import("logokikaiout.dxf", layer="logokikaiout");
}

module filament_guide() {
    translate([0, block_height, 0]) {
        difference() {
            block();
            #translate ([0, block_height/2-block_anchor_height, block_thickness]) logo();
        }
    }

    translate([nema17_bolt_distance/2, 0, 0]) plunger();
}

mirror([1, 0, 0]) filament_guide();
!	filament_guide();
